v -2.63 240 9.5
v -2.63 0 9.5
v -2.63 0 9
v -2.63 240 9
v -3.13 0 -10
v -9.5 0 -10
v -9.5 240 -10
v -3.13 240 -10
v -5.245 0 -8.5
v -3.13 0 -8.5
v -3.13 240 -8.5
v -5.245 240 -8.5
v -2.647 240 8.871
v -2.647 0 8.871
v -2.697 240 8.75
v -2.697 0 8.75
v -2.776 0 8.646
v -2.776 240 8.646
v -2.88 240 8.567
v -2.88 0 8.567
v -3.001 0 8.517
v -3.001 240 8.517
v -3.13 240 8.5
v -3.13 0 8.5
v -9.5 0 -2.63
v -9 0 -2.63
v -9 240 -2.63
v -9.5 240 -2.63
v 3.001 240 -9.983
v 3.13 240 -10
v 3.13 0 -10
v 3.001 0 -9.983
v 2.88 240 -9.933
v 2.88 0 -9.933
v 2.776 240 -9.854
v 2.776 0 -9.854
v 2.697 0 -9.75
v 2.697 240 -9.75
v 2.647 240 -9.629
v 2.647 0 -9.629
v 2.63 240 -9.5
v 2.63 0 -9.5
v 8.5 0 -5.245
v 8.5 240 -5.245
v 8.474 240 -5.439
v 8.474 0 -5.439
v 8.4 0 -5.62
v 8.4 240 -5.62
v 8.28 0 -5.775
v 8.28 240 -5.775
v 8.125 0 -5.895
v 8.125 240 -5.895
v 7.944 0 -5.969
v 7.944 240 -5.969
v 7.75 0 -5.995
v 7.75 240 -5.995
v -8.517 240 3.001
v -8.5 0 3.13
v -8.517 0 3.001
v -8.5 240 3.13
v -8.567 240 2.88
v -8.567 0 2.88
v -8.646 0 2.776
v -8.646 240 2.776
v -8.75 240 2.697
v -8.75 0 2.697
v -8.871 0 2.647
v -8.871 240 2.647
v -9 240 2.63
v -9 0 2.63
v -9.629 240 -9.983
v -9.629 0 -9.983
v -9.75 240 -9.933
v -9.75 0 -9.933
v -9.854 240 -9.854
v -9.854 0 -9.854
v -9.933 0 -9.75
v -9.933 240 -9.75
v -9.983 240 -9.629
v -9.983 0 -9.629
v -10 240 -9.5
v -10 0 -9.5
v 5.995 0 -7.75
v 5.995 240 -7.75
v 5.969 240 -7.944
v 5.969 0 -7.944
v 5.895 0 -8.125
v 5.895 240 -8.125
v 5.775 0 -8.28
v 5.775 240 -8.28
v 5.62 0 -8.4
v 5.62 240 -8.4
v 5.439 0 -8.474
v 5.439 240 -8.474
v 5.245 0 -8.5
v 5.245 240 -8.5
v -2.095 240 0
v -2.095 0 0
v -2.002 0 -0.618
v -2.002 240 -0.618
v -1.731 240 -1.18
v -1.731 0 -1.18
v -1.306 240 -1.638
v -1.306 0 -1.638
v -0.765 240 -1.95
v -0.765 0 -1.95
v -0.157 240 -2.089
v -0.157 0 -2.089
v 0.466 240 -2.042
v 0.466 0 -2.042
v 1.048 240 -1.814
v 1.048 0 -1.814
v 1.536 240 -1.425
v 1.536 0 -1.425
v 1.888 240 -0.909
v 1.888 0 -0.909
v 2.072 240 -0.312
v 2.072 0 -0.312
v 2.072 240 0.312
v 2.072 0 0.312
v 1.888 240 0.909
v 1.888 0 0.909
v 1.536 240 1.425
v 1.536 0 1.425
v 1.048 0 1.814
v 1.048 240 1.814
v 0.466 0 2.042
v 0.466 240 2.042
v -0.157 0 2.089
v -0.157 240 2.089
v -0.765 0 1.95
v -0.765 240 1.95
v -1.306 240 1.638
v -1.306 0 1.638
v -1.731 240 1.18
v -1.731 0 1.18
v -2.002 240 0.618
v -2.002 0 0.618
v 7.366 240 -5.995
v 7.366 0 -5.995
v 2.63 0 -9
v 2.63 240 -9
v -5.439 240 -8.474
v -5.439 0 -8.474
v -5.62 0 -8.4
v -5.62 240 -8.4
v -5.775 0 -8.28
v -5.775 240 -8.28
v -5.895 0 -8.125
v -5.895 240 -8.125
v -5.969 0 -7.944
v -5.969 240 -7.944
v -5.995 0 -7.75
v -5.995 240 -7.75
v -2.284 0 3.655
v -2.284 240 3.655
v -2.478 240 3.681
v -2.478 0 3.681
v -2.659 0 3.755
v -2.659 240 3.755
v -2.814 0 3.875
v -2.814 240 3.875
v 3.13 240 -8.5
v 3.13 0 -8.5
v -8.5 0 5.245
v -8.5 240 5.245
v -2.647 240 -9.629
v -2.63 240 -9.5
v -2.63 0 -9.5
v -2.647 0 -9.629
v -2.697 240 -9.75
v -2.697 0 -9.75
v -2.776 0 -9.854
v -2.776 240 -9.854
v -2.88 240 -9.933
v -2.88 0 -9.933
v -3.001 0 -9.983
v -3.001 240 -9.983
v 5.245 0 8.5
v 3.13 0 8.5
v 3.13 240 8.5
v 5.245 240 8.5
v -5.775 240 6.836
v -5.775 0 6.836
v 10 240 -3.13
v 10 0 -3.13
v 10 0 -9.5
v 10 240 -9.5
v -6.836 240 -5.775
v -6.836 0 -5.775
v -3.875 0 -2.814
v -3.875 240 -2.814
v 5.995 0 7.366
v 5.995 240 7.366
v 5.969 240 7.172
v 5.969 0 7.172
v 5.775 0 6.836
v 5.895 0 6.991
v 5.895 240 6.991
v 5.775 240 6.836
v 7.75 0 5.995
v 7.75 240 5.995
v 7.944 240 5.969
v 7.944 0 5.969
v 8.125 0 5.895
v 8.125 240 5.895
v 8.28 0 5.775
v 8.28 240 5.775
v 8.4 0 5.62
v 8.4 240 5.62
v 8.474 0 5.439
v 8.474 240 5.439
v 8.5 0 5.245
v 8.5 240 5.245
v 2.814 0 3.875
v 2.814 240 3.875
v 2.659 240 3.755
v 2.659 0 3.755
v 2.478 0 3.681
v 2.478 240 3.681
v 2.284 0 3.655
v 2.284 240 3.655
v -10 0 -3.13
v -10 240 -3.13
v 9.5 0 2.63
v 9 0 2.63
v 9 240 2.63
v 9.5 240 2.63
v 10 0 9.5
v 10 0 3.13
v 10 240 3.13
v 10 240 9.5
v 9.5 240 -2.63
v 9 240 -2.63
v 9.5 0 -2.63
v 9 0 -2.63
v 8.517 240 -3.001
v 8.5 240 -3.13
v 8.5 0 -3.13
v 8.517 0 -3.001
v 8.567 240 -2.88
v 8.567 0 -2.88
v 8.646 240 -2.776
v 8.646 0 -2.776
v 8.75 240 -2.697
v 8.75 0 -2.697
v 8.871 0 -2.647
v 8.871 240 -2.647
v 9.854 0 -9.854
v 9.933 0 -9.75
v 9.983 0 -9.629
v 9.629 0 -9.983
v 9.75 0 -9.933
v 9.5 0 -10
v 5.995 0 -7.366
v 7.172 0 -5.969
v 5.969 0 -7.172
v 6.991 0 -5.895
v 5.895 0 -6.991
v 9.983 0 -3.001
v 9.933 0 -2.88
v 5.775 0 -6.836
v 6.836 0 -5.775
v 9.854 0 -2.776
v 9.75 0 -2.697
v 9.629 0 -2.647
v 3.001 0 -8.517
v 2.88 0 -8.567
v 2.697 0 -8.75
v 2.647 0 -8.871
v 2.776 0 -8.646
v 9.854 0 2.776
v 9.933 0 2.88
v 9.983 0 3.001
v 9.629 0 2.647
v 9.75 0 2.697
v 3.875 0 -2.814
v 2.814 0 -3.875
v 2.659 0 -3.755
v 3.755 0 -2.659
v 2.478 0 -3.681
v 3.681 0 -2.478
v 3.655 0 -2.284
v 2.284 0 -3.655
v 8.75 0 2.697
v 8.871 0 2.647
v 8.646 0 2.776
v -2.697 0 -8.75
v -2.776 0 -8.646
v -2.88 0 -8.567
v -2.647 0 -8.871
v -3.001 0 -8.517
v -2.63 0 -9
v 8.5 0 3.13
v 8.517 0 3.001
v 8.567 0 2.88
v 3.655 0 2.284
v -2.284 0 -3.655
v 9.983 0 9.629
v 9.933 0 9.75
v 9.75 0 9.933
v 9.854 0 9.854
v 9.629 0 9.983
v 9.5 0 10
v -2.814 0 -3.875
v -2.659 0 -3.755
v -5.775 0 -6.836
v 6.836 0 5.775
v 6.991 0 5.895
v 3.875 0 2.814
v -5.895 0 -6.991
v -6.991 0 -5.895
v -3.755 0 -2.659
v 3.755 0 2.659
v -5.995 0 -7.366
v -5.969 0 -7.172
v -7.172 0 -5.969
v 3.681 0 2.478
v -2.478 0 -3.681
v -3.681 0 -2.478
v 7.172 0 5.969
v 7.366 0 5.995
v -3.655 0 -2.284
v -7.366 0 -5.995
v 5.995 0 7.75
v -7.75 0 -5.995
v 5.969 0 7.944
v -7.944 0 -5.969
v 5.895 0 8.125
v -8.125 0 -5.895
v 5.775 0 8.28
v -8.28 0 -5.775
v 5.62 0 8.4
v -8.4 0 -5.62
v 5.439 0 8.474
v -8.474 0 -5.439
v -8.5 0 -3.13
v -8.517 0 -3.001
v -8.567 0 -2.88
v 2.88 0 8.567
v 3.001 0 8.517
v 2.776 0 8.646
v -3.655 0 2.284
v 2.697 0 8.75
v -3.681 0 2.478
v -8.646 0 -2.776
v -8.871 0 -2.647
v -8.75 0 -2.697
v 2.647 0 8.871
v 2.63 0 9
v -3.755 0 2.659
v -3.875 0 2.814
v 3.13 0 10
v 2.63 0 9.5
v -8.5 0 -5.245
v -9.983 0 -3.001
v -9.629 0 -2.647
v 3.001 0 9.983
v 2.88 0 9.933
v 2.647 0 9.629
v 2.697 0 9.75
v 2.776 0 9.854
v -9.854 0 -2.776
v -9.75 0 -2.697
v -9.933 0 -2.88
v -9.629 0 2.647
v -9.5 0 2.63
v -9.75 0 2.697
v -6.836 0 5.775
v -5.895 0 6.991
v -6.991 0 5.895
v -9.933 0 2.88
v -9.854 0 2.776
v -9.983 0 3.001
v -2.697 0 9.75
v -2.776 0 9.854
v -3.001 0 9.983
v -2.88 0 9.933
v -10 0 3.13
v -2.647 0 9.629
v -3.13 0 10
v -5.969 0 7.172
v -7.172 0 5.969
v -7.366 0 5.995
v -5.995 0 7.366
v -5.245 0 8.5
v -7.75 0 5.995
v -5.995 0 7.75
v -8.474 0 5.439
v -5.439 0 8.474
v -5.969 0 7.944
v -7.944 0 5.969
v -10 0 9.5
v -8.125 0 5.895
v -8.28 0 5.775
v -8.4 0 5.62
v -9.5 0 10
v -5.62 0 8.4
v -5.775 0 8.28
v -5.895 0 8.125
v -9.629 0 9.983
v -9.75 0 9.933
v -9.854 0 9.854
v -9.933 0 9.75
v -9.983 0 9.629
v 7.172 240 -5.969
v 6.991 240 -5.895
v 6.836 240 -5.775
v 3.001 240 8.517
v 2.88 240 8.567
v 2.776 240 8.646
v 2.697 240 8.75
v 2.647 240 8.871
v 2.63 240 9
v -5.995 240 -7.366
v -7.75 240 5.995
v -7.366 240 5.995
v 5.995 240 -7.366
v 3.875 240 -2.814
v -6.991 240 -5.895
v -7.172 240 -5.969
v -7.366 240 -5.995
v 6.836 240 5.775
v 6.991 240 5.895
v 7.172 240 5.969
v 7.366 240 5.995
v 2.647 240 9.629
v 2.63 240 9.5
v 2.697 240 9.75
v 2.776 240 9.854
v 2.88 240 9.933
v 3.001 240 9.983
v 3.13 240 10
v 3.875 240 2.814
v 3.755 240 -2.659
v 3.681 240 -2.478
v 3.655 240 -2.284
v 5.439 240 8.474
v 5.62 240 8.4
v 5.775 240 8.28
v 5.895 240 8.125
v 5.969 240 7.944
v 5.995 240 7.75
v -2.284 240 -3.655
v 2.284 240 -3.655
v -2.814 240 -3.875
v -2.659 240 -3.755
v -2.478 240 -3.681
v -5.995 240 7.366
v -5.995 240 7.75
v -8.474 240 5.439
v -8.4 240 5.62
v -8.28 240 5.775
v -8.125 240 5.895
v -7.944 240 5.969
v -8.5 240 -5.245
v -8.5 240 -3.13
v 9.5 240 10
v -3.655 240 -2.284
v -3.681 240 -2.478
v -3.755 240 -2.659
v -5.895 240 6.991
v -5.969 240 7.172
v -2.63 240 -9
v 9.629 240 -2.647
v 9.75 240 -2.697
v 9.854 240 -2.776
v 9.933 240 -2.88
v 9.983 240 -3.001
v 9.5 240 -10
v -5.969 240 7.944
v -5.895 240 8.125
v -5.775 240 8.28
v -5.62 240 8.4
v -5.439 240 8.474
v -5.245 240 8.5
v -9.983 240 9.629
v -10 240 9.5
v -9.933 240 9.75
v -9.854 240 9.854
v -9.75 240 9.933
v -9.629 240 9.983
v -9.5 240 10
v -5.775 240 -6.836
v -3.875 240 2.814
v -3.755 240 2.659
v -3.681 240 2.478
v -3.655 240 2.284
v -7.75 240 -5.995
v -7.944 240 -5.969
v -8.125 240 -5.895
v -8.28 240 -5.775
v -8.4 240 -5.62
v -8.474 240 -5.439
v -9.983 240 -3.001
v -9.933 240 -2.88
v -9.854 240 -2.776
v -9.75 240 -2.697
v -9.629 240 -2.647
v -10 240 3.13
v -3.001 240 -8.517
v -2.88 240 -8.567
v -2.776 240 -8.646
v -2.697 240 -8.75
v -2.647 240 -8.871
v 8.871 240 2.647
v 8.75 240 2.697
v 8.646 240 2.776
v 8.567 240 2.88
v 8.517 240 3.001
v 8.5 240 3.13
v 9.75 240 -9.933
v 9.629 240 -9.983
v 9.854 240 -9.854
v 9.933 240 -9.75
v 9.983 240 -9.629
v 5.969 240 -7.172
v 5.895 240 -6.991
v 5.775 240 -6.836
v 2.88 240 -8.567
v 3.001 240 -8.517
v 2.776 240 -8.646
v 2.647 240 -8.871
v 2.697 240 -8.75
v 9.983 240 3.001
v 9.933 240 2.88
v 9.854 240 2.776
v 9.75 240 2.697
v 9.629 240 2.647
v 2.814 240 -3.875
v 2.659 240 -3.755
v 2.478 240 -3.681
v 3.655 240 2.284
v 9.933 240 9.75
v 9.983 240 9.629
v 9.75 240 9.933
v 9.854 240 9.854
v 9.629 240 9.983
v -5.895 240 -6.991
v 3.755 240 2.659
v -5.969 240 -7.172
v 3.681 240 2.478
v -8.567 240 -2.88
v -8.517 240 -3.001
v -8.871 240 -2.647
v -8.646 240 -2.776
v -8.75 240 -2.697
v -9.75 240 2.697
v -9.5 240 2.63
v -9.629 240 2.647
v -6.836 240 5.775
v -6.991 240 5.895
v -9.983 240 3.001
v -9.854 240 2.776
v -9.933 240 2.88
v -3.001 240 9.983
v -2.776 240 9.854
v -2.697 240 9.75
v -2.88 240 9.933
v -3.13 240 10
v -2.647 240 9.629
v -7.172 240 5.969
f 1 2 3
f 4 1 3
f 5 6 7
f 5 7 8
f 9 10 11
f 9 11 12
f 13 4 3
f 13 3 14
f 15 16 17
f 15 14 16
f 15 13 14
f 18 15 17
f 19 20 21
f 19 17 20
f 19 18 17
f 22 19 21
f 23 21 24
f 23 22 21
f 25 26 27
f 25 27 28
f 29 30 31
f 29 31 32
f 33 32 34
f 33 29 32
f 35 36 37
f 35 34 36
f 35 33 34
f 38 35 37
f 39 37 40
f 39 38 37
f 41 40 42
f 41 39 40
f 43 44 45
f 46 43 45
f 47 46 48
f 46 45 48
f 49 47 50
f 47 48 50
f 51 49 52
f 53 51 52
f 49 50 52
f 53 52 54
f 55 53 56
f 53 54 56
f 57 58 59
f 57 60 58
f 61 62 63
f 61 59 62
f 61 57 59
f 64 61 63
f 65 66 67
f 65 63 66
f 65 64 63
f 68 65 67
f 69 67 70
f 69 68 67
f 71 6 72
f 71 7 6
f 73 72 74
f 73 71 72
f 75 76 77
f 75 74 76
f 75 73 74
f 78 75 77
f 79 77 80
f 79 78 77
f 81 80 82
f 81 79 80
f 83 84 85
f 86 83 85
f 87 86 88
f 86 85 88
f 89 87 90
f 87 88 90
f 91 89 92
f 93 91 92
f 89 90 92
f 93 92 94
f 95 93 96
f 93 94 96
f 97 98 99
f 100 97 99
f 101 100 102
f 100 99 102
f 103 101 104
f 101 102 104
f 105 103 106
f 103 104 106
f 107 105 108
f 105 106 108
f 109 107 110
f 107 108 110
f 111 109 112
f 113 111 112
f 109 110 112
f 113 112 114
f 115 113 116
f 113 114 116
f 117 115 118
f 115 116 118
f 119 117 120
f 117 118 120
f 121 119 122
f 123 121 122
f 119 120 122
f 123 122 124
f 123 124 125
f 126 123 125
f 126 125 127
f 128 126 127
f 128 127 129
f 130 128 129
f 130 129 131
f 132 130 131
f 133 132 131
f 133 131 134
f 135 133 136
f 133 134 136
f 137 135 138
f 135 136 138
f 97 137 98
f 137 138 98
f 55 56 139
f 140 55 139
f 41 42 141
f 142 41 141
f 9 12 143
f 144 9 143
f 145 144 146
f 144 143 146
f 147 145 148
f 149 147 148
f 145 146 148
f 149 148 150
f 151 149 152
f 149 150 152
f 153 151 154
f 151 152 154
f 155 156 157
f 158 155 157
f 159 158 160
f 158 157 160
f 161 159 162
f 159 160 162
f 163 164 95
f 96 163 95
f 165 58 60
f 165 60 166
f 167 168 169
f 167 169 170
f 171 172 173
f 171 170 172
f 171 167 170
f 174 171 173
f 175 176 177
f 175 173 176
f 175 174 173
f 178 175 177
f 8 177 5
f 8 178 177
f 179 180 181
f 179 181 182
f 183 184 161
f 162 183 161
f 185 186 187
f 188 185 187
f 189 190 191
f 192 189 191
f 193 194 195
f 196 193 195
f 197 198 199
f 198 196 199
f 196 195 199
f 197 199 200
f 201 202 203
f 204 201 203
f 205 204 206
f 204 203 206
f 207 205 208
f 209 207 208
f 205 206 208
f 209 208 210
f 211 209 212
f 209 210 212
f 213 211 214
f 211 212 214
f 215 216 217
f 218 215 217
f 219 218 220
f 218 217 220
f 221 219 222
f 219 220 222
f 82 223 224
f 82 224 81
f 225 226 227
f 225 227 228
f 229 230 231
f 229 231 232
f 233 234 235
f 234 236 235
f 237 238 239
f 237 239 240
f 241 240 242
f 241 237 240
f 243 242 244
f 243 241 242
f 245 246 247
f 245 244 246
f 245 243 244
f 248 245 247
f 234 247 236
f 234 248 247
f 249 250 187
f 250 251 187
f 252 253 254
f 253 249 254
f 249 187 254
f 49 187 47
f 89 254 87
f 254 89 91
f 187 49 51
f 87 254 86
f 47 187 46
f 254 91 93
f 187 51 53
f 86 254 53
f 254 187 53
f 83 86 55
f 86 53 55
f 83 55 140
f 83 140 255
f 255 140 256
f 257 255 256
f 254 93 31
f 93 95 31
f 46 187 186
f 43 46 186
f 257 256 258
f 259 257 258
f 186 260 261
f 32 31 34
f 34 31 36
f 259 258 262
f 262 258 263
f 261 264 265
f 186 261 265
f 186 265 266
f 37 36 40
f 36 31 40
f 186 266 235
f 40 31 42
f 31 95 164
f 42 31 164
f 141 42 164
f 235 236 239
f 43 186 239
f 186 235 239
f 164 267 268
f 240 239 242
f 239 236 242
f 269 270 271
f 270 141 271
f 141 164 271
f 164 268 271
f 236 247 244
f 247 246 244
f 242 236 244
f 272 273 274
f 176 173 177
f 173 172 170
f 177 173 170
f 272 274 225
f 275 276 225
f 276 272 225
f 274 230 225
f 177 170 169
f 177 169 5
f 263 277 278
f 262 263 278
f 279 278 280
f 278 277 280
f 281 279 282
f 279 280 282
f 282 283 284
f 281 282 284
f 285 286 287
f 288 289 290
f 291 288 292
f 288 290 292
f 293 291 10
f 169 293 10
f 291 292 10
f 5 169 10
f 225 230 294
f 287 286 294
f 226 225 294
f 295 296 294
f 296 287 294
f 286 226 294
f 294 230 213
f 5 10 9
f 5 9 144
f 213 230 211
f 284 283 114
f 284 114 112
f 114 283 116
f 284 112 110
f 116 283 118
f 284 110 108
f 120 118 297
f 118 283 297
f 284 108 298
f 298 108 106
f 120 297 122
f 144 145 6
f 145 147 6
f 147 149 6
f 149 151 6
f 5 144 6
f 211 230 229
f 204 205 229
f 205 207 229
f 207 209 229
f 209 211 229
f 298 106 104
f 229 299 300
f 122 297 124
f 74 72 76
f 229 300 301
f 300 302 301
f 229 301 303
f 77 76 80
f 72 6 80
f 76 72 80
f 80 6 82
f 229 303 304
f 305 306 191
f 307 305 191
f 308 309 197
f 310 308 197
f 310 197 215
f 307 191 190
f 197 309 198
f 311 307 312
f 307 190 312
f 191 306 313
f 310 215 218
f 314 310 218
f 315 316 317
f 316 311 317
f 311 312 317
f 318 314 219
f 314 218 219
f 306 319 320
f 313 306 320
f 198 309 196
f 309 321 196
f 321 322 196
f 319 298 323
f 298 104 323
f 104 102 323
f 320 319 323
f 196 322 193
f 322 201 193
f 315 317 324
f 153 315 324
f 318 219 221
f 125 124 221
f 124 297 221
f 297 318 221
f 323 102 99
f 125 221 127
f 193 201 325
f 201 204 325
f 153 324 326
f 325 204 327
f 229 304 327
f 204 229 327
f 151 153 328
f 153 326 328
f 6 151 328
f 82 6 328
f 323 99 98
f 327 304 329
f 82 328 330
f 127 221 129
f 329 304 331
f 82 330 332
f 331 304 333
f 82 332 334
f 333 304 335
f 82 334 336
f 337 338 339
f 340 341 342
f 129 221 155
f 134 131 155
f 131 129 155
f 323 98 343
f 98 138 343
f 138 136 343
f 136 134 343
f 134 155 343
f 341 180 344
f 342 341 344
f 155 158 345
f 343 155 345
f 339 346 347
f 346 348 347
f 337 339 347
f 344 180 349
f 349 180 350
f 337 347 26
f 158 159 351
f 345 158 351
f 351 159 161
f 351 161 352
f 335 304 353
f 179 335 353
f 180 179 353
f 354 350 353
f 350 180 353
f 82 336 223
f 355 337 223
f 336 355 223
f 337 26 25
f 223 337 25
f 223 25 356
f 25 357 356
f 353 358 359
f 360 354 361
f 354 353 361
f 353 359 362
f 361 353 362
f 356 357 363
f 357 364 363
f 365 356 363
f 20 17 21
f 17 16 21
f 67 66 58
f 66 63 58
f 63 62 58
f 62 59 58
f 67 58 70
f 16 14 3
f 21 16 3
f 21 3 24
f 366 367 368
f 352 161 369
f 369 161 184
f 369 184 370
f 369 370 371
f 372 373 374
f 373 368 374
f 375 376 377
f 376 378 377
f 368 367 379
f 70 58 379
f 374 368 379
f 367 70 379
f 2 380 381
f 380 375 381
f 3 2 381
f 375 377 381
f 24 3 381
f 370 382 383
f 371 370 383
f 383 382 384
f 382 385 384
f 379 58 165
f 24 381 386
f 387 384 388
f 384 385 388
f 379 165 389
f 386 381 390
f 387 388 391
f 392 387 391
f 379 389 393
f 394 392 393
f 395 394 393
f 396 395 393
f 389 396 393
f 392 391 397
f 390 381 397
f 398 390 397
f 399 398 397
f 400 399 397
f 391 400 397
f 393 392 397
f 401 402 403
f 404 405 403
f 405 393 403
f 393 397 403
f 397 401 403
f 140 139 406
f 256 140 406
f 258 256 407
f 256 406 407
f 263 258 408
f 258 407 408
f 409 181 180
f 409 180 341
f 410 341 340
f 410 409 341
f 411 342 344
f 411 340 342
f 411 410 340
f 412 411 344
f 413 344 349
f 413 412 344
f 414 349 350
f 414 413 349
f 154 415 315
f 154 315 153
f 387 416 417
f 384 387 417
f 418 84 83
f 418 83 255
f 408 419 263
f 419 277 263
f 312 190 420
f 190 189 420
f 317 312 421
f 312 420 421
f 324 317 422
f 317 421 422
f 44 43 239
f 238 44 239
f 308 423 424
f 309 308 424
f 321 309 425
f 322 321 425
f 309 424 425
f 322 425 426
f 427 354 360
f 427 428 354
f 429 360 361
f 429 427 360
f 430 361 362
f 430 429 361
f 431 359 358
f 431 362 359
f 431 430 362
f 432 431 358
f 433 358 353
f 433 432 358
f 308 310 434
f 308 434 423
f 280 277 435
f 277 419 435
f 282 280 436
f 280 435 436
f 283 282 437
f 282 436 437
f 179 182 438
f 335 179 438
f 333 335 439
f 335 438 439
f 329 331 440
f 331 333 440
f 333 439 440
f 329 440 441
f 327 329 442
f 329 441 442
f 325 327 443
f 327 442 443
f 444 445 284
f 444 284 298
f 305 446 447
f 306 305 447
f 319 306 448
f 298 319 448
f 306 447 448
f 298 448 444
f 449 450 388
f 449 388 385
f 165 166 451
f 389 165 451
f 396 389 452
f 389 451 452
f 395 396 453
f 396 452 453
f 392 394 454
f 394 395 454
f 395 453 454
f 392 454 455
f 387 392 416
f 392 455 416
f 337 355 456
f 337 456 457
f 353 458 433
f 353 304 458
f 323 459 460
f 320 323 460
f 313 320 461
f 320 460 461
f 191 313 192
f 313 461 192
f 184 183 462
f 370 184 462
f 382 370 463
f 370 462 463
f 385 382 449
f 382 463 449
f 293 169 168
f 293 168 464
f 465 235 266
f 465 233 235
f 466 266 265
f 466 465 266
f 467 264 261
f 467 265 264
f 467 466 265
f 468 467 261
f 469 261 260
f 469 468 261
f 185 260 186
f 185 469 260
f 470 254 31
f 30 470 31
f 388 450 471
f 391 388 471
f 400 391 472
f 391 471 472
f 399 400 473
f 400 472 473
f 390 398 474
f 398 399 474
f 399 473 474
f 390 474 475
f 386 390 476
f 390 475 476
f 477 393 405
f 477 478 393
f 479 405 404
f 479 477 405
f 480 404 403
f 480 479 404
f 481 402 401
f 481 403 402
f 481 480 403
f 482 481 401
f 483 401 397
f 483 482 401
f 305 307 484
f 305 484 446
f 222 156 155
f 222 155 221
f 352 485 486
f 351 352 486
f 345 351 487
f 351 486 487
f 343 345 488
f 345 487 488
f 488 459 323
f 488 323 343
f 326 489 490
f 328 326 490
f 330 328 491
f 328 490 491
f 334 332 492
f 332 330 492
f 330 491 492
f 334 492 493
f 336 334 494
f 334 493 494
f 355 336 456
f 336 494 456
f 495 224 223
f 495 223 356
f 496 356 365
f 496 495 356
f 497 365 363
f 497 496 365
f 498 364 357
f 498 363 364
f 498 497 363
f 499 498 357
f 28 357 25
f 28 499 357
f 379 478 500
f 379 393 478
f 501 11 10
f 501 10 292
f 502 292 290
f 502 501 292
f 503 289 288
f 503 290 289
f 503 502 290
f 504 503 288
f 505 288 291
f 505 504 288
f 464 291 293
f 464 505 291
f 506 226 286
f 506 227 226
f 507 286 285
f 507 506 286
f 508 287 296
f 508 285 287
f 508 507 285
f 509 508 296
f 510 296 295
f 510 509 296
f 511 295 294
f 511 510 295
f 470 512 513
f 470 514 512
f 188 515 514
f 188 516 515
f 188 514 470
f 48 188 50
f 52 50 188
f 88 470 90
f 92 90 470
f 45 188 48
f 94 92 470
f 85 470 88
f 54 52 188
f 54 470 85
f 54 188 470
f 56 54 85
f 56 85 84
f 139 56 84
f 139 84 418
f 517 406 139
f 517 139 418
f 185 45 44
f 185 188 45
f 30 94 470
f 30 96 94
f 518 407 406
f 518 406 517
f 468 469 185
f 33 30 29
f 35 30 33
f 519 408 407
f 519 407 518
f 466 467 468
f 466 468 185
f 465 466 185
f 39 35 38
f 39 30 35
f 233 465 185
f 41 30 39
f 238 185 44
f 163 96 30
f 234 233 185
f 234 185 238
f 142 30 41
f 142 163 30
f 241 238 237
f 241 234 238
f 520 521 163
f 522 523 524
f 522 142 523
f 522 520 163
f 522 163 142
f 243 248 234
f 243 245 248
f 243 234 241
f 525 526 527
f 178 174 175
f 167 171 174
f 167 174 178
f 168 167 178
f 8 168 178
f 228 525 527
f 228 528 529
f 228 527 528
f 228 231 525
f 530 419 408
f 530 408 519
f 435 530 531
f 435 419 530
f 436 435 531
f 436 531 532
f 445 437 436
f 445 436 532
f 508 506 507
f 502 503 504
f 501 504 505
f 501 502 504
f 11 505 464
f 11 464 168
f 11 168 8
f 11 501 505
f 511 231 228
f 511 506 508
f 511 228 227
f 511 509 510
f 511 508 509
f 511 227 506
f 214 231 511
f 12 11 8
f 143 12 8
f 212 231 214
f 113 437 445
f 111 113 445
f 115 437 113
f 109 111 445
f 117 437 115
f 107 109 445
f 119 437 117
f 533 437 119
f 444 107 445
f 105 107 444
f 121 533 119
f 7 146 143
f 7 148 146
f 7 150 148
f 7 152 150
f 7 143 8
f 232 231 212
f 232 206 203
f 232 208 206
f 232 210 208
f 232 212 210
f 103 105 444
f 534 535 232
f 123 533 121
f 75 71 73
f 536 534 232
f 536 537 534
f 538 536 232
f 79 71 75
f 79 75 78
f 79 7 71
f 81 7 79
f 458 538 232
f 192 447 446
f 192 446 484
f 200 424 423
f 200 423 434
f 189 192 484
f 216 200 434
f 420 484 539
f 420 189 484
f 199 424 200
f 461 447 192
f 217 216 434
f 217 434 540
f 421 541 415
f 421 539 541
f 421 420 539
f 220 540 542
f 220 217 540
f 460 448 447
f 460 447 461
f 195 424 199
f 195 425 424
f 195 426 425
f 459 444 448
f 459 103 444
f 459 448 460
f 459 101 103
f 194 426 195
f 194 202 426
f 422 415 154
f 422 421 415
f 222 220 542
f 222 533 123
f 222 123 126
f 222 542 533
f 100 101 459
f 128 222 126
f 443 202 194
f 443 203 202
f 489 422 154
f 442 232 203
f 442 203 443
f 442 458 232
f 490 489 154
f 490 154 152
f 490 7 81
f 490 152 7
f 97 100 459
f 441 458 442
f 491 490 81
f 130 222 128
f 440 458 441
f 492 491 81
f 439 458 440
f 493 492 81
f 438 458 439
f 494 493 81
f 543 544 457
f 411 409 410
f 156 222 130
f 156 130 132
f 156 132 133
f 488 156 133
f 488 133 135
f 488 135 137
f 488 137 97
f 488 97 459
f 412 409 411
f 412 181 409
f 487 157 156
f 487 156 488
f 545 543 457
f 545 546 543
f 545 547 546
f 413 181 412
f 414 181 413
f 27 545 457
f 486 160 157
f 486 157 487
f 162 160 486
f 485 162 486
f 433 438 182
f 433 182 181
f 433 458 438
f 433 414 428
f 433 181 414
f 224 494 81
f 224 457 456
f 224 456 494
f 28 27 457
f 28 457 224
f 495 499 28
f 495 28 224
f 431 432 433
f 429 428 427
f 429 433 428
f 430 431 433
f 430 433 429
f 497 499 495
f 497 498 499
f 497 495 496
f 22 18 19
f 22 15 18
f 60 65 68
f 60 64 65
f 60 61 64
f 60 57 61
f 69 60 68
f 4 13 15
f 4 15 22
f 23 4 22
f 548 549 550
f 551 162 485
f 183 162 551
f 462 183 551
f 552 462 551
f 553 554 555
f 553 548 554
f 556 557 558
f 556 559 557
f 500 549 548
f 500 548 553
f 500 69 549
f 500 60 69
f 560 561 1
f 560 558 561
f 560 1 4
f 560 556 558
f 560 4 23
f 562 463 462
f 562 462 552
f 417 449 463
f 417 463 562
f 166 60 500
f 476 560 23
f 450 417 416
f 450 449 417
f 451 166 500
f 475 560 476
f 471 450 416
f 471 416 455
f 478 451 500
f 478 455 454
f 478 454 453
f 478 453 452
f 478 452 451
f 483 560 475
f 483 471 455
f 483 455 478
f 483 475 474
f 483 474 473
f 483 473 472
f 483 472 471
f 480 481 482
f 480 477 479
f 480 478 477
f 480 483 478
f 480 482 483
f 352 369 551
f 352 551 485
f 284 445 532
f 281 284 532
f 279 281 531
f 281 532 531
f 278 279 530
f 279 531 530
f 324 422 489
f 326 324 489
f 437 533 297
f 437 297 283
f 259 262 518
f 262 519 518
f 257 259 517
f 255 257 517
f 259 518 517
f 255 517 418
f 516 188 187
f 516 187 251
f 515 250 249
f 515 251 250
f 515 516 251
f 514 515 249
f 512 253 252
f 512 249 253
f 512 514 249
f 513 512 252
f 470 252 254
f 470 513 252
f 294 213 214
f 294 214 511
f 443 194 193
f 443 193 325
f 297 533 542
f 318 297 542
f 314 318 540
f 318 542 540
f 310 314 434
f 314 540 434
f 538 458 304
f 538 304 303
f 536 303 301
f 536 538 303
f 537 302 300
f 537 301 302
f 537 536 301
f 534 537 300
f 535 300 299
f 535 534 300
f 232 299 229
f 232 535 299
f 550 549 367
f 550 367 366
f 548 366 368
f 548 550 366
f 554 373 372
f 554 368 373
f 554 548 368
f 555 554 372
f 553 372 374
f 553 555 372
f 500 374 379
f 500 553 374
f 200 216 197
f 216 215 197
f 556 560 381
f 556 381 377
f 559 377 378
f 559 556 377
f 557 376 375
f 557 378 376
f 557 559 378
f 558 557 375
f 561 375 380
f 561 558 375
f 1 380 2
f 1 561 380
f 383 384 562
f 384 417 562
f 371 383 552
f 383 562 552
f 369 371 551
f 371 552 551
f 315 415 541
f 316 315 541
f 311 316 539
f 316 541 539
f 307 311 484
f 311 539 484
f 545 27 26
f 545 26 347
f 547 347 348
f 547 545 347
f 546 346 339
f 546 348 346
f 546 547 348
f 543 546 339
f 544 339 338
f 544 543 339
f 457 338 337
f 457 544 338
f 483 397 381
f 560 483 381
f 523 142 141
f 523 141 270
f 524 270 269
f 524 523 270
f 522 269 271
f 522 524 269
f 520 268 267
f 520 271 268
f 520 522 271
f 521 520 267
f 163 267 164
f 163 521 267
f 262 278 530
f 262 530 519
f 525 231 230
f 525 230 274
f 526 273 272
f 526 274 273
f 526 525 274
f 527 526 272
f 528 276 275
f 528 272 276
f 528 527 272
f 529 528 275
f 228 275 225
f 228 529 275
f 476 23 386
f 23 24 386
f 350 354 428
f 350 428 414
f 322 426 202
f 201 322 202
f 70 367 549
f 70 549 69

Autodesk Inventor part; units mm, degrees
ref_plane "YZ Plane" through (0, 0, 0) normal (1, 0, 0) x (0, 1, 0)
ref_plane "XZ Plane" through (0, 0, 0) normal (0, 1, 0) x (-1, 0, 0)
ref_plane "XY Plane" through (0, 0, 0) normal (0, 0, 1) x (1, 0, 0)
sketch "Sketch1" plane through (0, 0, 0) normal (0, 1, 0) x (-1, 0, 0)
  line L0 (0, -14) -> (0, 14) projected
  line L1 (-14, 0) -> (14, 0) projected
  line L2 (14, 0) -> (-14, 0) projected
  line L3 (0, -14) -> (0, 14) projected
  line L4 (2.5943, 3.655) -> (-2.5943, 3.655)
  line L5 (-3.655, 2.5943) -> (-3.655, -2.5943)
  line L6 (-2.5943, -3.655) -> (2.5943, -3.655)
  line L7 (3.655, -2.5943) -> (3.655, 2.5943)
  line L8 (-3.655, 3.655) -> (3.655, -3.655) construction
  line L9 (10, 10) -> (10, 2.63)
  line L10 (10, 2.63) -> (8.5, 2.63)
  line L11 (10, 10) -> (2.63, 10)
  line L12 (2.63, 10) -> (2.63, 8.5)
  line L13 (-10, 10) -> (-2.63, 10)
  line L14 (-2.63, 10) -> (-2.63, 8.5)
  line L15 (-10, 8.5) -> (-10, 10)
  line L16 (-10, 10) -> (-8.5, 10)
  line L17 (-8.5, 2.63) -> (-10, 2.63)
  line L18 (-10, 2.63) -> (-10, 10)
  line L19 (-10, -10) -> (-8.5, -10)
  line L20 (-8.5, -2.63) -> (-10, -2.63)
  line L21 (-10, -2.63) -> (-10, -10)
  line L22 (-10, -10) -> (-2.63, -10)
  line L23 (-2.63, -10) -> (-2.63, -8.5)
  line L24 (-10, -8.5) -> (-10, -10)
  line L25 (10, -10) -> (8.5, -10)
  line L26 (8.5, -2.63) -> (10, -2.63)
  line L27 (10, -2.63) -> (10, -10)
  line L28 (10, -10) -> (2.63, -10)
  line L29 (2.63, -10) -> (2.63, -8.5)
  line L30 (10, -8.5) -> (10, -10)
  circle A0 centre (0, 0) radius 2.095
  line L31 (5.995, -10) -> (2.63, -10)
  line L32 (-2.63, -10) -> (-5.995, -10)
  line L33 (10, -10) -> (2.63, -10)
  line L34 (-2.63, -10) -> (-10, -10)
  line L35 (10, -5.995) -> (10, -2.63)
  line L36 (10, 2.63) -> (10, 5.995)
  line L37 (10, 10) -> (10, 2.63)
  line L38 (10, -2.63) -> (10, -10)
  line L39 (-5.995, 10) -> (-2.63, 10)
  line L40 (2.63, 10) -> (5.995, 10)
  line L41 (-10, 10) -> (-2.63, 10)
  line L42 (2.63, 10) -> (10, 10)
  line L43 (-10, 5.995) -> (-10, 2.63)
  line L44 (-10, -2.63) -> (-10, -5.995)
  line L45 (-10, -10) -> (-10, -2.63)
  line L46 (-10, 2.63) -> (-10, 10)
  line L47 (-2.63, -8.5) -> (-5.995, -8.5)
  line L48 (-8.5, -5.995) -> (-8.5, -2.63)
  line L49 (-8.5, -5.995) -> (-7.0557, -5.995)
  line L50 (-5.995, -8.5) -> (-5.995, -7.0557)
  line L51 (-5.995, 7.0557) -> (-5.995, 8.5)
  line L52 (2.63, 8.5) -> (5.995, 8.5)
  line L53 (8.5, 2.63) -> (8.5, 5.995)
  line L54 (8.5, 5.995) -> (7.0557, 5.995)
  line L55 (5.995, 8.5) -> (5.995, 7.0557)
  line L56 (2.63, -8.5) -> (5.995, -8.5)
  line L57 (9.5607, -8.5) -> (10, -8.5)
  line L58 (8.5, -10) -> (8.5, -9.5607)
  line L59 (8.5, -5.995) -> (8.5, -2.63)
  line L60 (7.0557, -5.995) -> (8.5, -5.995)
  line L61 (5.995, -7.0557) -> (5.995, -8.5)
  line L62 (3.655, 3.655) -> (-0.5303, -0.5303) construction
  line L63 (-1.4814, -1.4814) -> (-3.655, -3.655) construction
  line L64 (-8.5, 10) -> (-8.5, 9.5607)
  line L65 (-8.5, 5.995) -> (-8.5, 2.63)
  line L66 (-2.63, 8.5) -> (-5.995, 8.5)
  line L67 (-9.5607, 8.5) -> (-10, 8.5)
  line L68 (-7.0557, 5.995) -> (-8.5, 5.995)
  line L69 (-3.655, 2.5943) -> (-7.0557, 5.995)
  line L70 (-2.5943, 3.655) -> (-5.995, 7.0557)
  line L71 (5.995, 7.0557) -> (2.5943, 3.655)
  line L72 (7.0557, 5.995) -> (3.655, 2.5943)
  line L73 (7.0557, -5.995) -> (3.655, -2.5943)
  line L74 (5.995, -7.0557) -> (2.5943, -3.655)
  line L75 (-2.5943, -3.655) -> (-5.995, -7.0557)
  line L76 (-3.655, -2.5943) -> (-7.0557, -5.995)
  dimension "d26" = 4.19
  dimension "d0" = 20
  dimension "d1" = 20
  dimension "d2" = 7.31
  dimension "d3" = 7.31
  dimension "d4" = 20
  dimension "d5" = 11.99
  dimension "d6" = 11.99
  dimension "d11" = 7.37
  dimension "d12" = 1.5
  dimension "d13" = 7.37
  dimension "d14" = 1.5
  dimension "d15" = 7.37
  dimension "d16" = 1.5
  dimension "d17" = 7.37
  dimension "d18" = 1.5
  dimension "d19" = 7.37
  dimension "d20" = 7.37
  dimension "d21" = 1.5
  dimension "d22" = 1.5
  dimension "d23" = 7.37
  dimension "d24" = 7.37
  dimension "d25" = 1.5
extrude "Extrusion1" add sketch "Sketch1" along normal blind 240 contours L6 L75 L50 L47 L23 L22 L19 L21 L20 L48 L49 L76 L5 L1 A0 L0 | L0 A0 L1 L7 L73 L60 L59 L26 L27 L25 L28 L29 L56 L61 L74 L6 | L1 L5 L69 L68 L65 L17 L18 L15 L13 L14 L66 L51 L70 L4 L0 A0 | A0 L0 L4 L71 L55 L52 L12 L11 L9 L10 L53 L54 L72 L7 L1
fillet "Fillet1" radius 0.5 20 edges at (10, 120, 10) (2.63, 120, 10) (-2.63, 120, 10) (-2.63, 120, 8.5) (10, 120, 2.63) (8.5, 120, 2.63) (10, 120, -2.63) (8.5, 120, -2.63) (10, 120, -10) (2.63, 120, -8.5) (-2.63, 120, -10) (-2.63, 120, -8.5) (2.63, 120, -10) (-10, 120, -10) (-8.5, 120, -2.63) (-10, 120, -2.63) (-8.5, 120, 2.63) (-10, 120, 2.63) (-10, 120, 10) (2.63, 120, 8.5)
fillet "Fillet2" radius 0.75 24 edges at (-7.0557, 120, 5.995) (-3.655, 120, 2.5943) (-8.5, 120, -5.995) (-7.0557, 120, -5.995) (-5.995, 120, -8.5) (3.655, 120, -2.5943) (7.0557, 120, -5.995) (-2.5943, 120, 3.655) (-5.995, 120, 7.0557) (3.655, 120, 2.5943) (7.0557, 120, 5.995) (8.5, 120, 5.995) (8.5, 120, -5.995) (2.5943, 120, 3.655) (5.995, 120, 7.0557) (5.995, 120, 8.5) (-5.995, 120, 8.5) (-8.5, 120, 5.995) (2.5943, 120, -3.655) (5.995, 120, -7.0557) (5.995, 120, -8.5) (-5.995, 120, -7.0557) (-2.5943, 120, -3.655) (-3.655, 120, -2.5943)
properties part number "Profile_Len_200mm"
